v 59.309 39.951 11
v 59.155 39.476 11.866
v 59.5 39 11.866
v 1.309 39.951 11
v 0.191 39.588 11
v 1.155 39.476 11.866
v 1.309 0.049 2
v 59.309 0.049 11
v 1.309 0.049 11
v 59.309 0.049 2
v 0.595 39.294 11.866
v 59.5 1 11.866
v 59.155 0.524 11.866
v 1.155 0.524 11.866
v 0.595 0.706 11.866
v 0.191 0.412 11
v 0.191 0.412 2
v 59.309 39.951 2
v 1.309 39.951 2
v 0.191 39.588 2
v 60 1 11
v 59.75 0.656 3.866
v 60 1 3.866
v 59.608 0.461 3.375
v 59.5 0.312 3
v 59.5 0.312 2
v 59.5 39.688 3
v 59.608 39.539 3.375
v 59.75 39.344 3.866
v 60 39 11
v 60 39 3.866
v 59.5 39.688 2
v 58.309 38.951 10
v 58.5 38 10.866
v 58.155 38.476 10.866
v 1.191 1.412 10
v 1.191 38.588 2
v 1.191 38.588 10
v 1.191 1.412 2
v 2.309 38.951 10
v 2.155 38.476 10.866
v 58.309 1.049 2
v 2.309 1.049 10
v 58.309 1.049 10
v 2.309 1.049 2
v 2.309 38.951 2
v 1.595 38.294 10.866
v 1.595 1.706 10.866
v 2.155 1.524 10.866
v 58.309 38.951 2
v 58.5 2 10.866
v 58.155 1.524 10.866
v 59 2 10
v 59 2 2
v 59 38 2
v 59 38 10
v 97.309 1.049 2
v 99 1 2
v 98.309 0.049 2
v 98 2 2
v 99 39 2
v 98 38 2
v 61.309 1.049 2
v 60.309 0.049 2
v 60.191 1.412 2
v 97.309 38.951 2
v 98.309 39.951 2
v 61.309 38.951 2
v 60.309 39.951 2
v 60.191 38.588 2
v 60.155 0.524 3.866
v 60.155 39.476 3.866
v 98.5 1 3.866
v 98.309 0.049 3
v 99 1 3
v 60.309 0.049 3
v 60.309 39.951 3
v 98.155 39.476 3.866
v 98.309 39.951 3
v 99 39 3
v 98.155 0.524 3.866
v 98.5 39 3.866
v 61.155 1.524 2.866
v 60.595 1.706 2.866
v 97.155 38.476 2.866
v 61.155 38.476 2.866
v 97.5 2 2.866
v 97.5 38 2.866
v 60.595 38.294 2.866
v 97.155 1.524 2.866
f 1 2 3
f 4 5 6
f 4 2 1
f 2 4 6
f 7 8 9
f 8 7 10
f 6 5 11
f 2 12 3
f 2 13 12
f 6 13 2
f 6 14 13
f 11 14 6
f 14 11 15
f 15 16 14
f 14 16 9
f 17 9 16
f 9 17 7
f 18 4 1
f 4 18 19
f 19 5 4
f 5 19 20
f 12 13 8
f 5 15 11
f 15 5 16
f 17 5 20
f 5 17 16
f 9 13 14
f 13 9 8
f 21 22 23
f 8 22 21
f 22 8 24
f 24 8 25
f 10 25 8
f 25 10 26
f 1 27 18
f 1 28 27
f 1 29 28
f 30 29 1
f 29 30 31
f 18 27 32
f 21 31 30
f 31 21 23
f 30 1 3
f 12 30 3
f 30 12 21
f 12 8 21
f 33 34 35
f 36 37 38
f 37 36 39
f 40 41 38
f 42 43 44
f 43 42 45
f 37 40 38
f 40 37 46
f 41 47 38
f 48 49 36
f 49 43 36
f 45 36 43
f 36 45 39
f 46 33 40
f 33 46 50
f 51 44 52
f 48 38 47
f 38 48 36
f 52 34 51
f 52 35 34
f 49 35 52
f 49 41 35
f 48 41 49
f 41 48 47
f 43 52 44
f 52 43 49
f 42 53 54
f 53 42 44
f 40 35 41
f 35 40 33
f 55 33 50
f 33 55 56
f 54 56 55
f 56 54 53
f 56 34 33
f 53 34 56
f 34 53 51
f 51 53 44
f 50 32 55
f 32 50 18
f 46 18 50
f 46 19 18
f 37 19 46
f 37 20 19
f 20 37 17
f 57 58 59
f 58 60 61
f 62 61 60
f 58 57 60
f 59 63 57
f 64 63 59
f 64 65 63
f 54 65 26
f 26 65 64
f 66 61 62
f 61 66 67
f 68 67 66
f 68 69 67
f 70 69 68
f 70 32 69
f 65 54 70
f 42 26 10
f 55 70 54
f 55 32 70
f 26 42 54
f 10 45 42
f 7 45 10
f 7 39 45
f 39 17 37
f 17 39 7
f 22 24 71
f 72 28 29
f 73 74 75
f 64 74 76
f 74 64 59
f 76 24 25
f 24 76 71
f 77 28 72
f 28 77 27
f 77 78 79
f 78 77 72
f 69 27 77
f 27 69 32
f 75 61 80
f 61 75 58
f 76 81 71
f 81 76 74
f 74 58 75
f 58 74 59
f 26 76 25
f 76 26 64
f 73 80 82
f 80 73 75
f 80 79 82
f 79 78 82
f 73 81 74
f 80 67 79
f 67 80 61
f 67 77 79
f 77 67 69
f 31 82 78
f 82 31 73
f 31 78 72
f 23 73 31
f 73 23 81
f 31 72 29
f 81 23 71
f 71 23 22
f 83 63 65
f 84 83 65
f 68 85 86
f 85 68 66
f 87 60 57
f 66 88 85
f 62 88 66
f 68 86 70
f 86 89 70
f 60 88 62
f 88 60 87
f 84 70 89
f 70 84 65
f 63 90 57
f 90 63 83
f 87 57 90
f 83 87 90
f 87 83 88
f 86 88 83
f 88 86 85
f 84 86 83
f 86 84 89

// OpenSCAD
module hollowBoxWithRoundedCorners(height, width, length, wall_thickness, corner_radius) {
    difference() {
        // Outer rounded box
        hull() {
            for (x = [0, length - corner_radius * 2])
                for (y = [0, width - corner_radius * 2])
                    for (z = [0, height - corner_radius * 2])
                        translate([x + corner_radius, y + corner_radius, z + corner_radius])
                            sphere(corner_radius);
        }

        // Inner cavity to make the box hollow
        translate([wall_thickness, wall_thickness, wall_thickness])
        hull() {
            for (x = [0, length - wall_thickness * 2 - corner_radius * 2])
                for (y = [0, width - wall_thickness * 2 - corner_radius * 2])
                    for (z = [0, height - wall_thickness * 2 - corner_radius * 2])
                        translate([x + corner_radius, y + corner_radius, z + corner_radius])
                            sphere(corner_radius);
        }

        // Removing the bottom
        translate([0, 0, 0])
        cube([length, width, wall_thickness+1]);
        
        // Removing the junction between the two boxes
        #cube([4, 4, wall_thickness]);
    }
}

// First box without bottom
hollowBoxWithRoundedCorners(12, 40, 60, 1, 1);

translate([59, 0, 0]) // Move the second box to avoid overlap
// Second box without bottom
hollowBoxWithRoundedCorners(4, 40, 40, 1, 1);
